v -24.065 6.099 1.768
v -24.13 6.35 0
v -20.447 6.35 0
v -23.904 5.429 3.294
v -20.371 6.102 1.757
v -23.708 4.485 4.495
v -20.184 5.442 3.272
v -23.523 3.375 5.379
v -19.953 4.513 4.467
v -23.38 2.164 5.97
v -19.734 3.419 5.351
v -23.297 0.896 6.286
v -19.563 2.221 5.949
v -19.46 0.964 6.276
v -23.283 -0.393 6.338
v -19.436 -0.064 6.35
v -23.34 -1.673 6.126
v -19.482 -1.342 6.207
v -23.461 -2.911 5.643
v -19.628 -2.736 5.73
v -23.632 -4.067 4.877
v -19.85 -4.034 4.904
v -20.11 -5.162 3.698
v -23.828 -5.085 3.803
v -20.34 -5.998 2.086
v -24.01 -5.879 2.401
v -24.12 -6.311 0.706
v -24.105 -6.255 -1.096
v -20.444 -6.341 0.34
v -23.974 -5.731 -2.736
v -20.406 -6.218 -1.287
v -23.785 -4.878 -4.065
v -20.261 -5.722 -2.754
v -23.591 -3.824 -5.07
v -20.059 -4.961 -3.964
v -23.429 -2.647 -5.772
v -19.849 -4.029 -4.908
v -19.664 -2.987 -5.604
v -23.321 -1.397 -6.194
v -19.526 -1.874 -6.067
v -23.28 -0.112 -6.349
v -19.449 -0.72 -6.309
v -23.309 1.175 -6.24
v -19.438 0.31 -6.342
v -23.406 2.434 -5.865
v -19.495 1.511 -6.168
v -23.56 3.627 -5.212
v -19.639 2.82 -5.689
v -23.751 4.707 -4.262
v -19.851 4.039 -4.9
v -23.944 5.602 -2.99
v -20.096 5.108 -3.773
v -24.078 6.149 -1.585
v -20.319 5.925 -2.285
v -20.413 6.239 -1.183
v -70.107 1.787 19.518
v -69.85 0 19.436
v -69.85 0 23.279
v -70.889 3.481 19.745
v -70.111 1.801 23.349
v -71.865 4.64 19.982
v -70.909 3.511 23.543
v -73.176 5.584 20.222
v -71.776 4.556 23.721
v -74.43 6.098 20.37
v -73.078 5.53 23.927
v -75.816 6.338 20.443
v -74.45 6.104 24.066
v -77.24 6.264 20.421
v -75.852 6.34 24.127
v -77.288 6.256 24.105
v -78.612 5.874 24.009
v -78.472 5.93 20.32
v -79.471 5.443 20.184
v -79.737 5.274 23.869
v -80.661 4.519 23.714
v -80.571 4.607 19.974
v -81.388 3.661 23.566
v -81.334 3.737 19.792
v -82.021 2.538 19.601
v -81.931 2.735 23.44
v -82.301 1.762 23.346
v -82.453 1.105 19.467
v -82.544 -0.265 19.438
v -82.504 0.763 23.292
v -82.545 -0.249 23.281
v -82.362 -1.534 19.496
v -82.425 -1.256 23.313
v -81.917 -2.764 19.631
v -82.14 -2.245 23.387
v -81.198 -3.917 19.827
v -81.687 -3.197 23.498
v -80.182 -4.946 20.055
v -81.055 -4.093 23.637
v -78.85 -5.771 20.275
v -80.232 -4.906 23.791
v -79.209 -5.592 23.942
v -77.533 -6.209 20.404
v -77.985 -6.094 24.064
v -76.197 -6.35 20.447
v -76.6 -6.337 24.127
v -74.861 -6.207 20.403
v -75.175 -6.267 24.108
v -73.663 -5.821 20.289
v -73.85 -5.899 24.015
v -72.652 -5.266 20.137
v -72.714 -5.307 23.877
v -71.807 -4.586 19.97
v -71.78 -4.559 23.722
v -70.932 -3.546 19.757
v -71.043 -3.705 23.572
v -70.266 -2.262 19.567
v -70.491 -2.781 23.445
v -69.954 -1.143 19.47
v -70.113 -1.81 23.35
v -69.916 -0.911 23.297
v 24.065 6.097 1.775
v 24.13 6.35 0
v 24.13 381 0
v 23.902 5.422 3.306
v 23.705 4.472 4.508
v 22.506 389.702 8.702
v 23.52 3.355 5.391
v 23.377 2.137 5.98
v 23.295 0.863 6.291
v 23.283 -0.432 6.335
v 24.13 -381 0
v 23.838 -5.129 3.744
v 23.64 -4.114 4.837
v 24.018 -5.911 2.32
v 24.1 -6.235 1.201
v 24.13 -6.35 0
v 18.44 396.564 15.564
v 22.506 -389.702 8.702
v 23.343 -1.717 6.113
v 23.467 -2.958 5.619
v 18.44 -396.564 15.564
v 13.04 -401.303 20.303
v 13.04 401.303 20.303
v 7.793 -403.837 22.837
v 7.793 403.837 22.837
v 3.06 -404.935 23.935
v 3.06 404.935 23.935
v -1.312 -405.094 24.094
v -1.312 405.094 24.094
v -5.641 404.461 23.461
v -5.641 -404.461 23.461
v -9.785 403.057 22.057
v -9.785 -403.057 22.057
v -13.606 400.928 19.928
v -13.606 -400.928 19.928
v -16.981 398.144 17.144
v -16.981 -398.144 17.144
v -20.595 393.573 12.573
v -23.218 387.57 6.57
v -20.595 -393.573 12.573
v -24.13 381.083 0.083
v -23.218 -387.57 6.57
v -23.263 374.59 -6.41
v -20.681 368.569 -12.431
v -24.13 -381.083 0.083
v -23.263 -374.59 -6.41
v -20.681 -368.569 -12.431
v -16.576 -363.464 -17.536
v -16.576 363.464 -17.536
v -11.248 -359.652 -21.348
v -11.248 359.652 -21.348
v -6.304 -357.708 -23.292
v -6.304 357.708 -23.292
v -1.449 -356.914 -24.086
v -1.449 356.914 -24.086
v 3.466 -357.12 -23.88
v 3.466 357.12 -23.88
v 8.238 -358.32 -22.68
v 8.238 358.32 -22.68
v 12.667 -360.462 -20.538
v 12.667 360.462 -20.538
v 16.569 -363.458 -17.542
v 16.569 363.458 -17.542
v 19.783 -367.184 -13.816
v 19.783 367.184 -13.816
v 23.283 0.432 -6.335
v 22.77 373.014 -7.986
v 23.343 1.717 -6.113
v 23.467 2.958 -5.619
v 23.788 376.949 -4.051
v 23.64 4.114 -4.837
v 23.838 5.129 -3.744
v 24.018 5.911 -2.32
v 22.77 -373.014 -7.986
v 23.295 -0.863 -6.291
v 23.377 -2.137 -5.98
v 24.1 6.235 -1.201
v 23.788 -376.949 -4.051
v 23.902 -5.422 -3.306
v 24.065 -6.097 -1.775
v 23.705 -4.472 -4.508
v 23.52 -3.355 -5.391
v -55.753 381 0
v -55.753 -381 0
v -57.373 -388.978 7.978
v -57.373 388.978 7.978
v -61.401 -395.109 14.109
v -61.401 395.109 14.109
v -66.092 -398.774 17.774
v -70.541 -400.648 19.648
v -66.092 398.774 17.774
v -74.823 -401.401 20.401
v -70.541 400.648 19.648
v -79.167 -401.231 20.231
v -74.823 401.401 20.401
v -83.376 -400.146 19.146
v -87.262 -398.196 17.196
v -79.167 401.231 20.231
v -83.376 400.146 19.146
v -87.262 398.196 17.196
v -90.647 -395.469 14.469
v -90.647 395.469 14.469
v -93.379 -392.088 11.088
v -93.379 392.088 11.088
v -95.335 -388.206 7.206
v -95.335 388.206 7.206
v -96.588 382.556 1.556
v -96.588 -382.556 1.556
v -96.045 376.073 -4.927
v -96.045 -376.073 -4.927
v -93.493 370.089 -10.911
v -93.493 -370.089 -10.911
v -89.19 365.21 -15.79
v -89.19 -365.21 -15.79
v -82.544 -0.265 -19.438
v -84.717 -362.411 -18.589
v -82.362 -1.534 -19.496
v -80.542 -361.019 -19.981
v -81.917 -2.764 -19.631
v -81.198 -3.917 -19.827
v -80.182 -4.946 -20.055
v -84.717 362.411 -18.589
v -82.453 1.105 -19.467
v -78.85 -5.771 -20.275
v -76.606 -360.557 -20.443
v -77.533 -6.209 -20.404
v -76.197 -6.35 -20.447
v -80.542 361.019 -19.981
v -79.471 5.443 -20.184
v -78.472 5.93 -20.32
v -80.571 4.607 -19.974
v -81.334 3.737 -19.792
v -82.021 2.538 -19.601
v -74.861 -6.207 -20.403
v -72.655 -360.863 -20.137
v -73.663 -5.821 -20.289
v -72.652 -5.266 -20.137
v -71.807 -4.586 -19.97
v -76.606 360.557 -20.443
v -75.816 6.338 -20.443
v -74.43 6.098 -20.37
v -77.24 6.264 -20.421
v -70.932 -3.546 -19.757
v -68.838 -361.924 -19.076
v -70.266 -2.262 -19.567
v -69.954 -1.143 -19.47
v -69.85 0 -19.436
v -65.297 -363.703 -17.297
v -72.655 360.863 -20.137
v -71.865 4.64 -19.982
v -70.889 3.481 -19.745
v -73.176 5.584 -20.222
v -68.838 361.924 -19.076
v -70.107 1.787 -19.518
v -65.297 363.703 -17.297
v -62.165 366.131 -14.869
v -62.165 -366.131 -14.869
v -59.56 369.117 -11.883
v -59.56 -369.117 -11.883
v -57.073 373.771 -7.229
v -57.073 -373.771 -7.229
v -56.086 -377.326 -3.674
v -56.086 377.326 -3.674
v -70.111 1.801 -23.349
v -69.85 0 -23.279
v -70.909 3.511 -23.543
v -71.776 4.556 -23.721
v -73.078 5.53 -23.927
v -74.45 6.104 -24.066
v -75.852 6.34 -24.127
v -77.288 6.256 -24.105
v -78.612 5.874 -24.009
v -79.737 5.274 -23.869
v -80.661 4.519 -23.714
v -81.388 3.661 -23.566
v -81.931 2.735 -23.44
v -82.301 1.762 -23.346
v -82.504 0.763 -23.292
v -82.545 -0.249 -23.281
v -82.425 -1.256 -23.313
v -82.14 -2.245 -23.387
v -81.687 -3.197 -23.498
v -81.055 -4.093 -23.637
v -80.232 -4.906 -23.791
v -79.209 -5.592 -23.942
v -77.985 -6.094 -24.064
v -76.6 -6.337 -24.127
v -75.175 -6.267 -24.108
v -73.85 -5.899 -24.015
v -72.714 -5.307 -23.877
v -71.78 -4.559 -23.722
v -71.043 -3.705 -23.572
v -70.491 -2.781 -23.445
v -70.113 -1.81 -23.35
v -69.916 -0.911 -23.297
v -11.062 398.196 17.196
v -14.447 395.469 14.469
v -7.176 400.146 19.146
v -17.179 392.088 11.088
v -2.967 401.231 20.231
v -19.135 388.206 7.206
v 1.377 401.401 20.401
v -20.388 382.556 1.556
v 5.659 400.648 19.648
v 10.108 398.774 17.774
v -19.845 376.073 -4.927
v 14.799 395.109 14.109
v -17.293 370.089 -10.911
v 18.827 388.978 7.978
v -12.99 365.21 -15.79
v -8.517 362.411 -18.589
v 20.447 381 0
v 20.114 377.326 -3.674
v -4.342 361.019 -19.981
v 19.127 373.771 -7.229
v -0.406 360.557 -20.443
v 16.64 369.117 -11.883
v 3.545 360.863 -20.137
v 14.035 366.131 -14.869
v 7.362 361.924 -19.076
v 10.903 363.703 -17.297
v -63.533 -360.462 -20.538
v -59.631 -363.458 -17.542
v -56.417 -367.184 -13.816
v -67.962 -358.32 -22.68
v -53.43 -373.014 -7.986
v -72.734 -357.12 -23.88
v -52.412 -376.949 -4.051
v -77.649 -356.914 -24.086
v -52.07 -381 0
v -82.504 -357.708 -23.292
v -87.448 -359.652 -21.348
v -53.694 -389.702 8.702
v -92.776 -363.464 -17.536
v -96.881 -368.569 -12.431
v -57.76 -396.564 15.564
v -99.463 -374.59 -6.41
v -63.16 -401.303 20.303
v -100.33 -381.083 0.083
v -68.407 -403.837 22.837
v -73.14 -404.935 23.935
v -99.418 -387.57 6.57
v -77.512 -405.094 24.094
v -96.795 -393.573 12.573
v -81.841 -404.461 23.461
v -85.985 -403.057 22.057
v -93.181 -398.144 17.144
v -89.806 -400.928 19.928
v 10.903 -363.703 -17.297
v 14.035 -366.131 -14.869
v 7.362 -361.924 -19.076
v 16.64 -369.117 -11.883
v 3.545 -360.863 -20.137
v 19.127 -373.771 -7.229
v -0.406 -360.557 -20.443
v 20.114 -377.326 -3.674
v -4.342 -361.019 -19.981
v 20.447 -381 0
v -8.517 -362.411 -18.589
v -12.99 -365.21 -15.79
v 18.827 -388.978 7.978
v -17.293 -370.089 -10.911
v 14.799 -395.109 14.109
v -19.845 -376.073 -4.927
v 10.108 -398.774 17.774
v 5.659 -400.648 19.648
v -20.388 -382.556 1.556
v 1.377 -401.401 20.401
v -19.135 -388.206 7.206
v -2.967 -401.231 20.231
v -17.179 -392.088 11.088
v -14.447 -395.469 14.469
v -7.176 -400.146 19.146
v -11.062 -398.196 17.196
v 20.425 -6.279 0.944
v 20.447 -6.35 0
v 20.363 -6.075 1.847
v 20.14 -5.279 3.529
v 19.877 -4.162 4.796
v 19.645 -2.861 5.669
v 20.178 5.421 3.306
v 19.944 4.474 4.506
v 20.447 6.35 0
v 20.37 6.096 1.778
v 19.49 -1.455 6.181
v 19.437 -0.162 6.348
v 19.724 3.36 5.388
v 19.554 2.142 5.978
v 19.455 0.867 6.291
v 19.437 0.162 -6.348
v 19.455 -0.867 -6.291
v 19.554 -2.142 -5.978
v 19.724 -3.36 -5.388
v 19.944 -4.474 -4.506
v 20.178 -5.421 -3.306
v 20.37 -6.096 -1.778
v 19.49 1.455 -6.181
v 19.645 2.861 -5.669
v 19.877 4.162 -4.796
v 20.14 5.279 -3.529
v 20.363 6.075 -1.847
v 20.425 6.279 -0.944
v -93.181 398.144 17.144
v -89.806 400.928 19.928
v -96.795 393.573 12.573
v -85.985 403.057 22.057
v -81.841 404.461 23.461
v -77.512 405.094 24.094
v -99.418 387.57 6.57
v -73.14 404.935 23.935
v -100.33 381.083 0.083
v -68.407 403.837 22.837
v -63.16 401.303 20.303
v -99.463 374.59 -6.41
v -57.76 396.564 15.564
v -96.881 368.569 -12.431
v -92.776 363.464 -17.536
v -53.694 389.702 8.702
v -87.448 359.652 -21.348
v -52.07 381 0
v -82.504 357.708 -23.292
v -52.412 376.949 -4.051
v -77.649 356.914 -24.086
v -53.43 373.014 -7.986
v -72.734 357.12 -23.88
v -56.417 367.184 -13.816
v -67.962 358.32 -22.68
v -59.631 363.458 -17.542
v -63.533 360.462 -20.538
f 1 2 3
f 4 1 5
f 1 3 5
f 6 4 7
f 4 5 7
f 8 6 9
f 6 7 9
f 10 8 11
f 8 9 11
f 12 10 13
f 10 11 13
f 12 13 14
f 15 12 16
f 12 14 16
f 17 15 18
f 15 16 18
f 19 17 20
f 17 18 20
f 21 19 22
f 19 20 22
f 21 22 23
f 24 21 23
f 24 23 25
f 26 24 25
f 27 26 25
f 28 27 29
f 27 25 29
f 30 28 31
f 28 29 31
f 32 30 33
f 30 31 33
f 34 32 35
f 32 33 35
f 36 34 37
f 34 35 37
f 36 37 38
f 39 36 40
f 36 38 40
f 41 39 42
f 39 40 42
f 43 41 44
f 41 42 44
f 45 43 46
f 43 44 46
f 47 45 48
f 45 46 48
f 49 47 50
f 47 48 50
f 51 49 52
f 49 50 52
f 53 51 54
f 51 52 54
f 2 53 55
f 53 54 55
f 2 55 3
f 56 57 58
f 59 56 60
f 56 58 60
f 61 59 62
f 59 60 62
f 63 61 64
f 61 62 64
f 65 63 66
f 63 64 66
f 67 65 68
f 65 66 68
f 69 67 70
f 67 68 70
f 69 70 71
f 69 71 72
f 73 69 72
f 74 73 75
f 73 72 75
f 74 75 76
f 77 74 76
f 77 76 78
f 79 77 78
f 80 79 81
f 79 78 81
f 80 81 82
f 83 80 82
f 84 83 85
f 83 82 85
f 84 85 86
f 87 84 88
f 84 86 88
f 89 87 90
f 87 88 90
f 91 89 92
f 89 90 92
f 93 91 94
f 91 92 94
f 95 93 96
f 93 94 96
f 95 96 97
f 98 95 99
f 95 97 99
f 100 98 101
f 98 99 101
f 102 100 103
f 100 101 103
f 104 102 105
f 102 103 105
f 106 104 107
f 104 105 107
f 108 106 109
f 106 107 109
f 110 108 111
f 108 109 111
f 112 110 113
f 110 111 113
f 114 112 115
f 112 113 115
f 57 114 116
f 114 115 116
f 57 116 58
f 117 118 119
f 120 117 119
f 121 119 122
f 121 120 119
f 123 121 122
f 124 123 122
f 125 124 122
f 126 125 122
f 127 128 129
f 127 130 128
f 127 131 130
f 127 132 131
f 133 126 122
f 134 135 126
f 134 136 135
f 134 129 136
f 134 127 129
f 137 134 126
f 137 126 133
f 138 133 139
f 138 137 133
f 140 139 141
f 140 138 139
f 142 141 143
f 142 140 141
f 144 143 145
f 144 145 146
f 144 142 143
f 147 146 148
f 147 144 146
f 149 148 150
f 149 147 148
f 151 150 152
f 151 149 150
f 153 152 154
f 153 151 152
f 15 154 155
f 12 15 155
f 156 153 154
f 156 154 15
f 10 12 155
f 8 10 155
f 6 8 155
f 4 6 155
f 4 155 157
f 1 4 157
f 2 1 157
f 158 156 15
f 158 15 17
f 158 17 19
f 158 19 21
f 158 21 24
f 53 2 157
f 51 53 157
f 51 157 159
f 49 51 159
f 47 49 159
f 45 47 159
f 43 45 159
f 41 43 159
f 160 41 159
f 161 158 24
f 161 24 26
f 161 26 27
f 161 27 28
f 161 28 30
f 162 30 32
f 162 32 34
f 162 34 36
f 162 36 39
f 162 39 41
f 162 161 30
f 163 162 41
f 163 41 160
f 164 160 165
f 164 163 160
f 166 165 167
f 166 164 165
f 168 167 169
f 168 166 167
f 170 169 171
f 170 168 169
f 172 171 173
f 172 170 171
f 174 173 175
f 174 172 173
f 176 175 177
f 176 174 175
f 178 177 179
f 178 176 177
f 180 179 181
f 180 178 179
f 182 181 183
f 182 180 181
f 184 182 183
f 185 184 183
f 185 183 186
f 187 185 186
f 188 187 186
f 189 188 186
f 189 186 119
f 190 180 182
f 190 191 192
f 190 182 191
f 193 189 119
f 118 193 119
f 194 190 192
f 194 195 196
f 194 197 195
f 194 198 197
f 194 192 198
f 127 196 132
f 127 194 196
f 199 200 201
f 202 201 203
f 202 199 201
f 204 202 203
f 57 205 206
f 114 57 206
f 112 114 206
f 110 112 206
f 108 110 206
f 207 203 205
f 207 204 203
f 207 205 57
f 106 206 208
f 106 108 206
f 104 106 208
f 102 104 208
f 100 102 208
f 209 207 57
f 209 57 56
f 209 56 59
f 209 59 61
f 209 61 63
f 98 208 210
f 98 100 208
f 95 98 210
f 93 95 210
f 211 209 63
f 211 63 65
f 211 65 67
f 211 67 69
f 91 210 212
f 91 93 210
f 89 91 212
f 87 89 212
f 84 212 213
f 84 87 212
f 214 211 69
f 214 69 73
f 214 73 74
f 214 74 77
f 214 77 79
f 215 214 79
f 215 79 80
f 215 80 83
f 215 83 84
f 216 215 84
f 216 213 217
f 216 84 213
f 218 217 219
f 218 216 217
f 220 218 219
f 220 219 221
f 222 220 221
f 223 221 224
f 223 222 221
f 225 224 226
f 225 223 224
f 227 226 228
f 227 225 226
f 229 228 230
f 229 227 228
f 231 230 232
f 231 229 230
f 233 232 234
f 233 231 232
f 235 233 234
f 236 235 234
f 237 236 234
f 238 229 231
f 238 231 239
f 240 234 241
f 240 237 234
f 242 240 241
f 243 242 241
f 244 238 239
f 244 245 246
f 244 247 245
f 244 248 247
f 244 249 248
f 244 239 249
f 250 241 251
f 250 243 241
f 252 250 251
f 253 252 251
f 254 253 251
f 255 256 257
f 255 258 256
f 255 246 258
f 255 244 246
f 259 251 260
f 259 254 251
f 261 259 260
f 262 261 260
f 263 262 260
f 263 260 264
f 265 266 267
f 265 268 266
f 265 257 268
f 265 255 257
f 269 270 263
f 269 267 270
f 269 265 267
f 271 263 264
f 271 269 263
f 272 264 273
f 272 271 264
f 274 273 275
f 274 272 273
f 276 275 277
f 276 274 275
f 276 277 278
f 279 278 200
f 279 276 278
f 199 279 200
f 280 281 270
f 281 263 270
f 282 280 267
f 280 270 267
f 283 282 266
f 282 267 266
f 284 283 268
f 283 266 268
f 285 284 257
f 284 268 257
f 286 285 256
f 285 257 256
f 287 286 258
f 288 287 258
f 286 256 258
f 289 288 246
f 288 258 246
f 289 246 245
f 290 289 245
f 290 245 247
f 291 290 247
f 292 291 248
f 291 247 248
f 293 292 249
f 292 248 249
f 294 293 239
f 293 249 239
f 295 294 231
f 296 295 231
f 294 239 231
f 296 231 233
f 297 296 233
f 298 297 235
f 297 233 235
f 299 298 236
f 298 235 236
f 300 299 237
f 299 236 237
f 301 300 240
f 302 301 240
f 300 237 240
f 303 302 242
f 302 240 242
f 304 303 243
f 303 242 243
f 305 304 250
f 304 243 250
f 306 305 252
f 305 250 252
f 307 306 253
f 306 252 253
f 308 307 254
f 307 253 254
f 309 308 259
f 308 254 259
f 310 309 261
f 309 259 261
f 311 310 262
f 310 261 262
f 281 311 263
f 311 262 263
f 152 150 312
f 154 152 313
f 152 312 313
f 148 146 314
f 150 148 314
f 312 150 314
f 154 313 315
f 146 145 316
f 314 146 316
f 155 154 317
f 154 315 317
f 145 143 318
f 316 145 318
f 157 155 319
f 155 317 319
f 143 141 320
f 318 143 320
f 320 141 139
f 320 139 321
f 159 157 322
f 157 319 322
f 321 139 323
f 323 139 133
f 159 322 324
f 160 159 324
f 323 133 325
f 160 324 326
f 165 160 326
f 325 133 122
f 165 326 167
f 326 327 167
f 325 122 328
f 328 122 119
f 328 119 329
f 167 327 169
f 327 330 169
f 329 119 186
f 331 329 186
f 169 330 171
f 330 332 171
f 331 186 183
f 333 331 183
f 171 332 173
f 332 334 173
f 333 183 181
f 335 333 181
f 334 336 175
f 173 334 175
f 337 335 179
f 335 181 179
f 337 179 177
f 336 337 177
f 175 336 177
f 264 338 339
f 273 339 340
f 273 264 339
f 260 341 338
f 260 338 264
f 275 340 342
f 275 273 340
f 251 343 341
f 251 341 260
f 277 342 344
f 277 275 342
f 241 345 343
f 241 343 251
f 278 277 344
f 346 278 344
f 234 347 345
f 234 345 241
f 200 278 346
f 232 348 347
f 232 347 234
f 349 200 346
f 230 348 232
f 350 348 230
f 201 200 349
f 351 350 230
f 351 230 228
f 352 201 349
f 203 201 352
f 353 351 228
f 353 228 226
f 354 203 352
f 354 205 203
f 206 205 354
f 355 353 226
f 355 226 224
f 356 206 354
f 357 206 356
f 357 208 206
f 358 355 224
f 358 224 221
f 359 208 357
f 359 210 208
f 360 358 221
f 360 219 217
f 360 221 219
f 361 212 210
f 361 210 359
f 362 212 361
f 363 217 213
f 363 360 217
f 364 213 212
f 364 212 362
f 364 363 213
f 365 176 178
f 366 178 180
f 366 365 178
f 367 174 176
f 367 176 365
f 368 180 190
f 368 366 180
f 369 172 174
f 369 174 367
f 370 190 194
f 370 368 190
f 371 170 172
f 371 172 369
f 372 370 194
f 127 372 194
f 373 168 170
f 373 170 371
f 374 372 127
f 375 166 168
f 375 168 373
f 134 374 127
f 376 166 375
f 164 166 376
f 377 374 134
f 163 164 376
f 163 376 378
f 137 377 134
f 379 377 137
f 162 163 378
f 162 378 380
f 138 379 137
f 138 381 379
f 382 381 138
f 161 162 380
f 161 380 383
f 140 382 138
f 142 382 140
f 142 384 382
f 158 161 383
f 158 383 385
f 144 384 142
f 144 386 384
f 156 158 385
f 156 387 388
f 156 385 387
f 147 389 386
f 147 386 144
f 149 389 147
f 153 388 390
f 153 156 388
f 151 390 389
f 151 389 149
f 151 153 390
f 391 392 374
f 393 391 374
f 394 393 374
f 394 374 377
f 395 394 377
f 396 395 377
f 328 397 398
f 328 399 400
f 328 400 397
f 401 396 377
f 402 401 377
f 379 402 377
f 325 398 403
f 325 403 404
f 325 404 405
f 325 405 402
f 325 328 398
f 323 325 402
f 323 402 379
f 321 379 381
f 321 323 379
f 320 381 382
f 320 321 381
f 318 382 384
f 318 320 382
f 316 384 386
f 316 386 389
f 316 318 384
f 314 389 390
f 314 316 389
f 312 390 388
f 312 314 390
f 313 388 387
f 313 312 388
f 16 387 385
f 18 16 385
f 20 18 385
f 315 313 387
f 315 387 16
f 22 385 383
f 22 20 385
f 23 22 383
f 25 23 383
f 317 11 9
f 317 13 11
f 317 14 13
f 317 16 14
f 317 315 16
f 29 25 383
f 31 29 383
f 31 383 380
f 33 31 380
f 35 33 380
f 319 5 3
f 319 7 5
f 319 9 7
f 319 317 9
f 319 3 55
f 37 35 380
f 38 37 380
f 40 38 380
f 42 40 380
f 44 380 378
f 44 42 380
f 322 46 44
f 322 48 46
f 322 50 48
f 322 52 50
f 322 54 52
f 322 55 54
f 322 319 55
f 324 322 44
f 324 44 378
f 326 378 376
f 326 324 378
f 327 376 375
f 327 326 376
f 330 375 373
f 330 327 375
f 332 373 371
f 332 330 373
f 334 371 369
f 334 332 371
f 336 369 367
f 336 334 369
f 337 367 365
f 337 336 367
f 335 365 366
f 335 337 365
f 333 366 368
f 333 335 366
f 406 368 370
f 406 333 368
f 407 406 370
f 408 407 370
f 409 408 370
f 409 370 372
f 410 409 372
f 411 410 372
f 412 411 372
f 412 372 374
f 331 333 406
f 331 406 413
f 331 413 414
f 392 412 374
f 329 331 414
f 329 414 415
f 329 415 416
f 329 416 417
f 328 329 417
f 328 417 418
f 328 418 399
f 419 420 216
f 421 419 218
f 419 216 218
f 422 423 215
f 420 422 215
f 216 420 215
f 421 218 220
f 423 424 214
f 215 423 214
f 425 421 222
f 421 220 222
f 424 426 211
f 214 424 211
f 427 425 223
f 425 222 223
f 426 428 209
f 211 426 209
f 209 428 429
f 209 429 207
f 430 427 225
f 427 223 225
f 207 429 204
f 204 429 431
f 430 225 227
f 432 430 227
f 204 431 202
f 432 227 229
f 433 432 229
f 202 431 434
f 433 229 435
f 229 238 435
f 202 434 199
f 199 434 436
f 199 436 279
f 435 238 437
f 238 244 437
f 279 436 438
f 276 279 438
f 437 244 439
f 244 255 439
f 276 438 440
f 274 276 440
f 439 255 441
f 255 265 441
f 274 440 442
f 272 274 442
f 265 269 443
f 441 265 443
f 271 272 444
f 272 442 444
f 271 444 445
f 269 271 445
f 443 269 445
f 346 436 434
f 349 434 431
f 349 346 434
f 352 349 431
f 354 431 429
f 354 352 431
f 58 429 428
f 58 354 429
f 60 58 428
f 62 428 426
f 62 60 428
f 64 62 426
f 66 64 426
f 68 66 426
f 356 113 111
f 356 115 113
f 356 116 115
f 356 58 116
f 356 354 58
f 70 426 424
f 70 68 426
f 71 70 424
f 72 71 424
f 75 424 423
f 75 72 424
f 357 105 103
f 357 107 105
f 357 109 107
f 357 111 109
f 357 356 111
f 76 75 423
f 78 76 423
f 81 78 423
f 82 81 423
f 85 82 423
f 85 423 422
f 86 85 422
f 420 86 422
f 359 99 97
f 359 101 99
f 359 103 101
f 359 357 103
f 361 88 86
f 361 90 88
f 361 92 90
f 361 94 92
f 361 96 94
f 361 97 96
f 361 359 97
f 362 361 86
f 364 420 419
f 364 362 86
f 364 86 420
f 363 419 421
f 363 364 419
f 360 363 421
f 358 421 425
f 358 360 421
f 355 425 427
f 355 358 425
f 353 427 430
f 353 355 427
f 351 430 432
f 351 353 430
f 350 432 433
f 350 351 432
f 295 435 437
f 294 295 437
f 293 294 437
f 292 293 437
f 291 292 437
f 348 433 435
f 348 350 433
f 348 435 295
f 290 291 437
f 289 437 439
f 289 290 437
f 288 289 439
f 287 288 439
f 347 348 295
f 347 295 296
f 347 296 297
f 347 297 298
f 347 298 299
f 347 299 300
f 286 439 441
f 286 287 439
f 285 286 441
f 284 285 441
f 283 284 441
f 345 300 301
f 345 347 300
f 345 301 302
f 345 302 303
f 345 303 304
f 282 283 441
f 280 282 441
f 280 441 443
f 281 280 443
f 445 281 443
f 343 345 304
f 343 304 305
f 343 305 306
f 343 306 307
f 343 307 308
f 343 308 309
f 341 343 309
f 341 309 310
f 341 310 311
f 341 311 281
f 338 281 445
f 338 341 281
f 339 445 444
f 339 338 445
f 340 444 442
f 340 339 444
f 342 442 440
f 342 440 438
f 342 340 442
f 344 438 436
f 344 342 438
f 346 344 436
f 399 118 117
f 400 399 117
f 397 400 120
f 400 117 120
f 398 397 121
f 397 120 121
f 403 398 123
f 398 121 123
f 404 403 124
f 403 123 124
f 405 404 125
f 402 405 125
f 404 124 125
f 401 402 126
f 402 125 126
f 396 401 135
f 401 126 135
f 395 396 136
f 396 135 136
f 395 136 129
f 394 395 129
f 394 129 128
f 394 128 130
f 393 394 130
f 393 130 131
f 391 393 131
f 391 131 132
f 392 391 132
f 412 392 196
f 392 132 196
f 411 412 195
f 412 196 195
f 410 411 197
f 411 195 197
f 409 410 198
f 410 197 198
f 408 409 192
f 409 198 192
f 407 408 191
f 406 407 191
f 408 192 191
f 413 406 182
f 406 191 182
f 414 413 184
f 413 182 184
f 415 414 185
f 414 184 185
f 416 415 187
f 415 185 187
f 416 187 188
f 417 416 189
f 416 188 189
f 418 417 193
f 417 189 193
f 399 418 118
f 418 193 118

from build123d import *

# Parameters (mm, degrees)
F0_R     = 24.13
F0_R_2   = 20.447
F1_DEPTH = 431.8
F2_R     = 24.13
F2_R_2   = 20.447
F3_DEPTH = 457.2
F5_DEPTH = 152.4
F6_R     = 6.35
F7_DEPTH = 76.2
F8_R     = 6.35
F9_DEPTH = 76.2


with BuildPart() as f1:
    # F0 (on Front) → F1 (new body, symmetric)
    with BuildSketch(Plane.XZ):
        Circle(F0_R)
        Circle(F0_R_2, mode=Mode.SUBTRACT)
    extrude(amount=F1_DEPTH, both=True)


with BuildPart() as f3:
    # F2 (on Front) → F3 (new body, symmetric)
    with BuildSketch(Plane.XZ):
        with Locations((-76.2, 0)):
            Circle(F2_R)
        with Locations((-76.2, 0)):
            Circle(F2_R_2, mode=Mode.SUBTRACT)
    extrude(amount=F3_DEPTH, both=True)


with BuildPart() as f5_tool:
    # F4 (on Right) → F5 (new body, symmetric)
    with BuildSketch(Plane.YZ):
        Polygon((-424.8299507257, 43.8299507257), (-462.2847161403, 104.5060300127), (-486.3353615056, -36.4805202162), (-324.6154958919, -56.3845041081), (-381, 0), align=None)
        Polygon((462.2847161403, 104.5060300127), (424.8299507257, 43.8299507257), (381, 0), (324.6154958919, -56.3845041081), (486.3353615056, -36.4805202162), align=None)
    extrude(amount=F5_DEPTH, both=True)


with BuildPart() as f1_1:
    add(f1.part)

    # F5: cut by f5_tool
    add(f5_tool.part, mode=Mode.SUBTRACT)

    # F6 (on Right) → F7 (cut, symmetric)
    with BuildSketch(Plane.YZ):
        Circle(F6_R)
    extrude(amount=F7_DEPTH, both=True, mode=Mode.SUBTRACT)


with BuildPart() as f3_1:
    add(f3.part)

    # F5: cut by f5_tool
    add(f5_tool.part, mode=Mode.SUBTRACT)

    # F8 (on Top) → F9 (cut, symmetric)
    with BuildSketch(Plane.XY):
        with Locations((-76.2, 0)):
            Circle(F8_R)
    extrude(amount=F9_DEPTH, both=True, mode=Mode.SUBTRACT)


solid = Compound([f1_1.part, f3_1.part])
